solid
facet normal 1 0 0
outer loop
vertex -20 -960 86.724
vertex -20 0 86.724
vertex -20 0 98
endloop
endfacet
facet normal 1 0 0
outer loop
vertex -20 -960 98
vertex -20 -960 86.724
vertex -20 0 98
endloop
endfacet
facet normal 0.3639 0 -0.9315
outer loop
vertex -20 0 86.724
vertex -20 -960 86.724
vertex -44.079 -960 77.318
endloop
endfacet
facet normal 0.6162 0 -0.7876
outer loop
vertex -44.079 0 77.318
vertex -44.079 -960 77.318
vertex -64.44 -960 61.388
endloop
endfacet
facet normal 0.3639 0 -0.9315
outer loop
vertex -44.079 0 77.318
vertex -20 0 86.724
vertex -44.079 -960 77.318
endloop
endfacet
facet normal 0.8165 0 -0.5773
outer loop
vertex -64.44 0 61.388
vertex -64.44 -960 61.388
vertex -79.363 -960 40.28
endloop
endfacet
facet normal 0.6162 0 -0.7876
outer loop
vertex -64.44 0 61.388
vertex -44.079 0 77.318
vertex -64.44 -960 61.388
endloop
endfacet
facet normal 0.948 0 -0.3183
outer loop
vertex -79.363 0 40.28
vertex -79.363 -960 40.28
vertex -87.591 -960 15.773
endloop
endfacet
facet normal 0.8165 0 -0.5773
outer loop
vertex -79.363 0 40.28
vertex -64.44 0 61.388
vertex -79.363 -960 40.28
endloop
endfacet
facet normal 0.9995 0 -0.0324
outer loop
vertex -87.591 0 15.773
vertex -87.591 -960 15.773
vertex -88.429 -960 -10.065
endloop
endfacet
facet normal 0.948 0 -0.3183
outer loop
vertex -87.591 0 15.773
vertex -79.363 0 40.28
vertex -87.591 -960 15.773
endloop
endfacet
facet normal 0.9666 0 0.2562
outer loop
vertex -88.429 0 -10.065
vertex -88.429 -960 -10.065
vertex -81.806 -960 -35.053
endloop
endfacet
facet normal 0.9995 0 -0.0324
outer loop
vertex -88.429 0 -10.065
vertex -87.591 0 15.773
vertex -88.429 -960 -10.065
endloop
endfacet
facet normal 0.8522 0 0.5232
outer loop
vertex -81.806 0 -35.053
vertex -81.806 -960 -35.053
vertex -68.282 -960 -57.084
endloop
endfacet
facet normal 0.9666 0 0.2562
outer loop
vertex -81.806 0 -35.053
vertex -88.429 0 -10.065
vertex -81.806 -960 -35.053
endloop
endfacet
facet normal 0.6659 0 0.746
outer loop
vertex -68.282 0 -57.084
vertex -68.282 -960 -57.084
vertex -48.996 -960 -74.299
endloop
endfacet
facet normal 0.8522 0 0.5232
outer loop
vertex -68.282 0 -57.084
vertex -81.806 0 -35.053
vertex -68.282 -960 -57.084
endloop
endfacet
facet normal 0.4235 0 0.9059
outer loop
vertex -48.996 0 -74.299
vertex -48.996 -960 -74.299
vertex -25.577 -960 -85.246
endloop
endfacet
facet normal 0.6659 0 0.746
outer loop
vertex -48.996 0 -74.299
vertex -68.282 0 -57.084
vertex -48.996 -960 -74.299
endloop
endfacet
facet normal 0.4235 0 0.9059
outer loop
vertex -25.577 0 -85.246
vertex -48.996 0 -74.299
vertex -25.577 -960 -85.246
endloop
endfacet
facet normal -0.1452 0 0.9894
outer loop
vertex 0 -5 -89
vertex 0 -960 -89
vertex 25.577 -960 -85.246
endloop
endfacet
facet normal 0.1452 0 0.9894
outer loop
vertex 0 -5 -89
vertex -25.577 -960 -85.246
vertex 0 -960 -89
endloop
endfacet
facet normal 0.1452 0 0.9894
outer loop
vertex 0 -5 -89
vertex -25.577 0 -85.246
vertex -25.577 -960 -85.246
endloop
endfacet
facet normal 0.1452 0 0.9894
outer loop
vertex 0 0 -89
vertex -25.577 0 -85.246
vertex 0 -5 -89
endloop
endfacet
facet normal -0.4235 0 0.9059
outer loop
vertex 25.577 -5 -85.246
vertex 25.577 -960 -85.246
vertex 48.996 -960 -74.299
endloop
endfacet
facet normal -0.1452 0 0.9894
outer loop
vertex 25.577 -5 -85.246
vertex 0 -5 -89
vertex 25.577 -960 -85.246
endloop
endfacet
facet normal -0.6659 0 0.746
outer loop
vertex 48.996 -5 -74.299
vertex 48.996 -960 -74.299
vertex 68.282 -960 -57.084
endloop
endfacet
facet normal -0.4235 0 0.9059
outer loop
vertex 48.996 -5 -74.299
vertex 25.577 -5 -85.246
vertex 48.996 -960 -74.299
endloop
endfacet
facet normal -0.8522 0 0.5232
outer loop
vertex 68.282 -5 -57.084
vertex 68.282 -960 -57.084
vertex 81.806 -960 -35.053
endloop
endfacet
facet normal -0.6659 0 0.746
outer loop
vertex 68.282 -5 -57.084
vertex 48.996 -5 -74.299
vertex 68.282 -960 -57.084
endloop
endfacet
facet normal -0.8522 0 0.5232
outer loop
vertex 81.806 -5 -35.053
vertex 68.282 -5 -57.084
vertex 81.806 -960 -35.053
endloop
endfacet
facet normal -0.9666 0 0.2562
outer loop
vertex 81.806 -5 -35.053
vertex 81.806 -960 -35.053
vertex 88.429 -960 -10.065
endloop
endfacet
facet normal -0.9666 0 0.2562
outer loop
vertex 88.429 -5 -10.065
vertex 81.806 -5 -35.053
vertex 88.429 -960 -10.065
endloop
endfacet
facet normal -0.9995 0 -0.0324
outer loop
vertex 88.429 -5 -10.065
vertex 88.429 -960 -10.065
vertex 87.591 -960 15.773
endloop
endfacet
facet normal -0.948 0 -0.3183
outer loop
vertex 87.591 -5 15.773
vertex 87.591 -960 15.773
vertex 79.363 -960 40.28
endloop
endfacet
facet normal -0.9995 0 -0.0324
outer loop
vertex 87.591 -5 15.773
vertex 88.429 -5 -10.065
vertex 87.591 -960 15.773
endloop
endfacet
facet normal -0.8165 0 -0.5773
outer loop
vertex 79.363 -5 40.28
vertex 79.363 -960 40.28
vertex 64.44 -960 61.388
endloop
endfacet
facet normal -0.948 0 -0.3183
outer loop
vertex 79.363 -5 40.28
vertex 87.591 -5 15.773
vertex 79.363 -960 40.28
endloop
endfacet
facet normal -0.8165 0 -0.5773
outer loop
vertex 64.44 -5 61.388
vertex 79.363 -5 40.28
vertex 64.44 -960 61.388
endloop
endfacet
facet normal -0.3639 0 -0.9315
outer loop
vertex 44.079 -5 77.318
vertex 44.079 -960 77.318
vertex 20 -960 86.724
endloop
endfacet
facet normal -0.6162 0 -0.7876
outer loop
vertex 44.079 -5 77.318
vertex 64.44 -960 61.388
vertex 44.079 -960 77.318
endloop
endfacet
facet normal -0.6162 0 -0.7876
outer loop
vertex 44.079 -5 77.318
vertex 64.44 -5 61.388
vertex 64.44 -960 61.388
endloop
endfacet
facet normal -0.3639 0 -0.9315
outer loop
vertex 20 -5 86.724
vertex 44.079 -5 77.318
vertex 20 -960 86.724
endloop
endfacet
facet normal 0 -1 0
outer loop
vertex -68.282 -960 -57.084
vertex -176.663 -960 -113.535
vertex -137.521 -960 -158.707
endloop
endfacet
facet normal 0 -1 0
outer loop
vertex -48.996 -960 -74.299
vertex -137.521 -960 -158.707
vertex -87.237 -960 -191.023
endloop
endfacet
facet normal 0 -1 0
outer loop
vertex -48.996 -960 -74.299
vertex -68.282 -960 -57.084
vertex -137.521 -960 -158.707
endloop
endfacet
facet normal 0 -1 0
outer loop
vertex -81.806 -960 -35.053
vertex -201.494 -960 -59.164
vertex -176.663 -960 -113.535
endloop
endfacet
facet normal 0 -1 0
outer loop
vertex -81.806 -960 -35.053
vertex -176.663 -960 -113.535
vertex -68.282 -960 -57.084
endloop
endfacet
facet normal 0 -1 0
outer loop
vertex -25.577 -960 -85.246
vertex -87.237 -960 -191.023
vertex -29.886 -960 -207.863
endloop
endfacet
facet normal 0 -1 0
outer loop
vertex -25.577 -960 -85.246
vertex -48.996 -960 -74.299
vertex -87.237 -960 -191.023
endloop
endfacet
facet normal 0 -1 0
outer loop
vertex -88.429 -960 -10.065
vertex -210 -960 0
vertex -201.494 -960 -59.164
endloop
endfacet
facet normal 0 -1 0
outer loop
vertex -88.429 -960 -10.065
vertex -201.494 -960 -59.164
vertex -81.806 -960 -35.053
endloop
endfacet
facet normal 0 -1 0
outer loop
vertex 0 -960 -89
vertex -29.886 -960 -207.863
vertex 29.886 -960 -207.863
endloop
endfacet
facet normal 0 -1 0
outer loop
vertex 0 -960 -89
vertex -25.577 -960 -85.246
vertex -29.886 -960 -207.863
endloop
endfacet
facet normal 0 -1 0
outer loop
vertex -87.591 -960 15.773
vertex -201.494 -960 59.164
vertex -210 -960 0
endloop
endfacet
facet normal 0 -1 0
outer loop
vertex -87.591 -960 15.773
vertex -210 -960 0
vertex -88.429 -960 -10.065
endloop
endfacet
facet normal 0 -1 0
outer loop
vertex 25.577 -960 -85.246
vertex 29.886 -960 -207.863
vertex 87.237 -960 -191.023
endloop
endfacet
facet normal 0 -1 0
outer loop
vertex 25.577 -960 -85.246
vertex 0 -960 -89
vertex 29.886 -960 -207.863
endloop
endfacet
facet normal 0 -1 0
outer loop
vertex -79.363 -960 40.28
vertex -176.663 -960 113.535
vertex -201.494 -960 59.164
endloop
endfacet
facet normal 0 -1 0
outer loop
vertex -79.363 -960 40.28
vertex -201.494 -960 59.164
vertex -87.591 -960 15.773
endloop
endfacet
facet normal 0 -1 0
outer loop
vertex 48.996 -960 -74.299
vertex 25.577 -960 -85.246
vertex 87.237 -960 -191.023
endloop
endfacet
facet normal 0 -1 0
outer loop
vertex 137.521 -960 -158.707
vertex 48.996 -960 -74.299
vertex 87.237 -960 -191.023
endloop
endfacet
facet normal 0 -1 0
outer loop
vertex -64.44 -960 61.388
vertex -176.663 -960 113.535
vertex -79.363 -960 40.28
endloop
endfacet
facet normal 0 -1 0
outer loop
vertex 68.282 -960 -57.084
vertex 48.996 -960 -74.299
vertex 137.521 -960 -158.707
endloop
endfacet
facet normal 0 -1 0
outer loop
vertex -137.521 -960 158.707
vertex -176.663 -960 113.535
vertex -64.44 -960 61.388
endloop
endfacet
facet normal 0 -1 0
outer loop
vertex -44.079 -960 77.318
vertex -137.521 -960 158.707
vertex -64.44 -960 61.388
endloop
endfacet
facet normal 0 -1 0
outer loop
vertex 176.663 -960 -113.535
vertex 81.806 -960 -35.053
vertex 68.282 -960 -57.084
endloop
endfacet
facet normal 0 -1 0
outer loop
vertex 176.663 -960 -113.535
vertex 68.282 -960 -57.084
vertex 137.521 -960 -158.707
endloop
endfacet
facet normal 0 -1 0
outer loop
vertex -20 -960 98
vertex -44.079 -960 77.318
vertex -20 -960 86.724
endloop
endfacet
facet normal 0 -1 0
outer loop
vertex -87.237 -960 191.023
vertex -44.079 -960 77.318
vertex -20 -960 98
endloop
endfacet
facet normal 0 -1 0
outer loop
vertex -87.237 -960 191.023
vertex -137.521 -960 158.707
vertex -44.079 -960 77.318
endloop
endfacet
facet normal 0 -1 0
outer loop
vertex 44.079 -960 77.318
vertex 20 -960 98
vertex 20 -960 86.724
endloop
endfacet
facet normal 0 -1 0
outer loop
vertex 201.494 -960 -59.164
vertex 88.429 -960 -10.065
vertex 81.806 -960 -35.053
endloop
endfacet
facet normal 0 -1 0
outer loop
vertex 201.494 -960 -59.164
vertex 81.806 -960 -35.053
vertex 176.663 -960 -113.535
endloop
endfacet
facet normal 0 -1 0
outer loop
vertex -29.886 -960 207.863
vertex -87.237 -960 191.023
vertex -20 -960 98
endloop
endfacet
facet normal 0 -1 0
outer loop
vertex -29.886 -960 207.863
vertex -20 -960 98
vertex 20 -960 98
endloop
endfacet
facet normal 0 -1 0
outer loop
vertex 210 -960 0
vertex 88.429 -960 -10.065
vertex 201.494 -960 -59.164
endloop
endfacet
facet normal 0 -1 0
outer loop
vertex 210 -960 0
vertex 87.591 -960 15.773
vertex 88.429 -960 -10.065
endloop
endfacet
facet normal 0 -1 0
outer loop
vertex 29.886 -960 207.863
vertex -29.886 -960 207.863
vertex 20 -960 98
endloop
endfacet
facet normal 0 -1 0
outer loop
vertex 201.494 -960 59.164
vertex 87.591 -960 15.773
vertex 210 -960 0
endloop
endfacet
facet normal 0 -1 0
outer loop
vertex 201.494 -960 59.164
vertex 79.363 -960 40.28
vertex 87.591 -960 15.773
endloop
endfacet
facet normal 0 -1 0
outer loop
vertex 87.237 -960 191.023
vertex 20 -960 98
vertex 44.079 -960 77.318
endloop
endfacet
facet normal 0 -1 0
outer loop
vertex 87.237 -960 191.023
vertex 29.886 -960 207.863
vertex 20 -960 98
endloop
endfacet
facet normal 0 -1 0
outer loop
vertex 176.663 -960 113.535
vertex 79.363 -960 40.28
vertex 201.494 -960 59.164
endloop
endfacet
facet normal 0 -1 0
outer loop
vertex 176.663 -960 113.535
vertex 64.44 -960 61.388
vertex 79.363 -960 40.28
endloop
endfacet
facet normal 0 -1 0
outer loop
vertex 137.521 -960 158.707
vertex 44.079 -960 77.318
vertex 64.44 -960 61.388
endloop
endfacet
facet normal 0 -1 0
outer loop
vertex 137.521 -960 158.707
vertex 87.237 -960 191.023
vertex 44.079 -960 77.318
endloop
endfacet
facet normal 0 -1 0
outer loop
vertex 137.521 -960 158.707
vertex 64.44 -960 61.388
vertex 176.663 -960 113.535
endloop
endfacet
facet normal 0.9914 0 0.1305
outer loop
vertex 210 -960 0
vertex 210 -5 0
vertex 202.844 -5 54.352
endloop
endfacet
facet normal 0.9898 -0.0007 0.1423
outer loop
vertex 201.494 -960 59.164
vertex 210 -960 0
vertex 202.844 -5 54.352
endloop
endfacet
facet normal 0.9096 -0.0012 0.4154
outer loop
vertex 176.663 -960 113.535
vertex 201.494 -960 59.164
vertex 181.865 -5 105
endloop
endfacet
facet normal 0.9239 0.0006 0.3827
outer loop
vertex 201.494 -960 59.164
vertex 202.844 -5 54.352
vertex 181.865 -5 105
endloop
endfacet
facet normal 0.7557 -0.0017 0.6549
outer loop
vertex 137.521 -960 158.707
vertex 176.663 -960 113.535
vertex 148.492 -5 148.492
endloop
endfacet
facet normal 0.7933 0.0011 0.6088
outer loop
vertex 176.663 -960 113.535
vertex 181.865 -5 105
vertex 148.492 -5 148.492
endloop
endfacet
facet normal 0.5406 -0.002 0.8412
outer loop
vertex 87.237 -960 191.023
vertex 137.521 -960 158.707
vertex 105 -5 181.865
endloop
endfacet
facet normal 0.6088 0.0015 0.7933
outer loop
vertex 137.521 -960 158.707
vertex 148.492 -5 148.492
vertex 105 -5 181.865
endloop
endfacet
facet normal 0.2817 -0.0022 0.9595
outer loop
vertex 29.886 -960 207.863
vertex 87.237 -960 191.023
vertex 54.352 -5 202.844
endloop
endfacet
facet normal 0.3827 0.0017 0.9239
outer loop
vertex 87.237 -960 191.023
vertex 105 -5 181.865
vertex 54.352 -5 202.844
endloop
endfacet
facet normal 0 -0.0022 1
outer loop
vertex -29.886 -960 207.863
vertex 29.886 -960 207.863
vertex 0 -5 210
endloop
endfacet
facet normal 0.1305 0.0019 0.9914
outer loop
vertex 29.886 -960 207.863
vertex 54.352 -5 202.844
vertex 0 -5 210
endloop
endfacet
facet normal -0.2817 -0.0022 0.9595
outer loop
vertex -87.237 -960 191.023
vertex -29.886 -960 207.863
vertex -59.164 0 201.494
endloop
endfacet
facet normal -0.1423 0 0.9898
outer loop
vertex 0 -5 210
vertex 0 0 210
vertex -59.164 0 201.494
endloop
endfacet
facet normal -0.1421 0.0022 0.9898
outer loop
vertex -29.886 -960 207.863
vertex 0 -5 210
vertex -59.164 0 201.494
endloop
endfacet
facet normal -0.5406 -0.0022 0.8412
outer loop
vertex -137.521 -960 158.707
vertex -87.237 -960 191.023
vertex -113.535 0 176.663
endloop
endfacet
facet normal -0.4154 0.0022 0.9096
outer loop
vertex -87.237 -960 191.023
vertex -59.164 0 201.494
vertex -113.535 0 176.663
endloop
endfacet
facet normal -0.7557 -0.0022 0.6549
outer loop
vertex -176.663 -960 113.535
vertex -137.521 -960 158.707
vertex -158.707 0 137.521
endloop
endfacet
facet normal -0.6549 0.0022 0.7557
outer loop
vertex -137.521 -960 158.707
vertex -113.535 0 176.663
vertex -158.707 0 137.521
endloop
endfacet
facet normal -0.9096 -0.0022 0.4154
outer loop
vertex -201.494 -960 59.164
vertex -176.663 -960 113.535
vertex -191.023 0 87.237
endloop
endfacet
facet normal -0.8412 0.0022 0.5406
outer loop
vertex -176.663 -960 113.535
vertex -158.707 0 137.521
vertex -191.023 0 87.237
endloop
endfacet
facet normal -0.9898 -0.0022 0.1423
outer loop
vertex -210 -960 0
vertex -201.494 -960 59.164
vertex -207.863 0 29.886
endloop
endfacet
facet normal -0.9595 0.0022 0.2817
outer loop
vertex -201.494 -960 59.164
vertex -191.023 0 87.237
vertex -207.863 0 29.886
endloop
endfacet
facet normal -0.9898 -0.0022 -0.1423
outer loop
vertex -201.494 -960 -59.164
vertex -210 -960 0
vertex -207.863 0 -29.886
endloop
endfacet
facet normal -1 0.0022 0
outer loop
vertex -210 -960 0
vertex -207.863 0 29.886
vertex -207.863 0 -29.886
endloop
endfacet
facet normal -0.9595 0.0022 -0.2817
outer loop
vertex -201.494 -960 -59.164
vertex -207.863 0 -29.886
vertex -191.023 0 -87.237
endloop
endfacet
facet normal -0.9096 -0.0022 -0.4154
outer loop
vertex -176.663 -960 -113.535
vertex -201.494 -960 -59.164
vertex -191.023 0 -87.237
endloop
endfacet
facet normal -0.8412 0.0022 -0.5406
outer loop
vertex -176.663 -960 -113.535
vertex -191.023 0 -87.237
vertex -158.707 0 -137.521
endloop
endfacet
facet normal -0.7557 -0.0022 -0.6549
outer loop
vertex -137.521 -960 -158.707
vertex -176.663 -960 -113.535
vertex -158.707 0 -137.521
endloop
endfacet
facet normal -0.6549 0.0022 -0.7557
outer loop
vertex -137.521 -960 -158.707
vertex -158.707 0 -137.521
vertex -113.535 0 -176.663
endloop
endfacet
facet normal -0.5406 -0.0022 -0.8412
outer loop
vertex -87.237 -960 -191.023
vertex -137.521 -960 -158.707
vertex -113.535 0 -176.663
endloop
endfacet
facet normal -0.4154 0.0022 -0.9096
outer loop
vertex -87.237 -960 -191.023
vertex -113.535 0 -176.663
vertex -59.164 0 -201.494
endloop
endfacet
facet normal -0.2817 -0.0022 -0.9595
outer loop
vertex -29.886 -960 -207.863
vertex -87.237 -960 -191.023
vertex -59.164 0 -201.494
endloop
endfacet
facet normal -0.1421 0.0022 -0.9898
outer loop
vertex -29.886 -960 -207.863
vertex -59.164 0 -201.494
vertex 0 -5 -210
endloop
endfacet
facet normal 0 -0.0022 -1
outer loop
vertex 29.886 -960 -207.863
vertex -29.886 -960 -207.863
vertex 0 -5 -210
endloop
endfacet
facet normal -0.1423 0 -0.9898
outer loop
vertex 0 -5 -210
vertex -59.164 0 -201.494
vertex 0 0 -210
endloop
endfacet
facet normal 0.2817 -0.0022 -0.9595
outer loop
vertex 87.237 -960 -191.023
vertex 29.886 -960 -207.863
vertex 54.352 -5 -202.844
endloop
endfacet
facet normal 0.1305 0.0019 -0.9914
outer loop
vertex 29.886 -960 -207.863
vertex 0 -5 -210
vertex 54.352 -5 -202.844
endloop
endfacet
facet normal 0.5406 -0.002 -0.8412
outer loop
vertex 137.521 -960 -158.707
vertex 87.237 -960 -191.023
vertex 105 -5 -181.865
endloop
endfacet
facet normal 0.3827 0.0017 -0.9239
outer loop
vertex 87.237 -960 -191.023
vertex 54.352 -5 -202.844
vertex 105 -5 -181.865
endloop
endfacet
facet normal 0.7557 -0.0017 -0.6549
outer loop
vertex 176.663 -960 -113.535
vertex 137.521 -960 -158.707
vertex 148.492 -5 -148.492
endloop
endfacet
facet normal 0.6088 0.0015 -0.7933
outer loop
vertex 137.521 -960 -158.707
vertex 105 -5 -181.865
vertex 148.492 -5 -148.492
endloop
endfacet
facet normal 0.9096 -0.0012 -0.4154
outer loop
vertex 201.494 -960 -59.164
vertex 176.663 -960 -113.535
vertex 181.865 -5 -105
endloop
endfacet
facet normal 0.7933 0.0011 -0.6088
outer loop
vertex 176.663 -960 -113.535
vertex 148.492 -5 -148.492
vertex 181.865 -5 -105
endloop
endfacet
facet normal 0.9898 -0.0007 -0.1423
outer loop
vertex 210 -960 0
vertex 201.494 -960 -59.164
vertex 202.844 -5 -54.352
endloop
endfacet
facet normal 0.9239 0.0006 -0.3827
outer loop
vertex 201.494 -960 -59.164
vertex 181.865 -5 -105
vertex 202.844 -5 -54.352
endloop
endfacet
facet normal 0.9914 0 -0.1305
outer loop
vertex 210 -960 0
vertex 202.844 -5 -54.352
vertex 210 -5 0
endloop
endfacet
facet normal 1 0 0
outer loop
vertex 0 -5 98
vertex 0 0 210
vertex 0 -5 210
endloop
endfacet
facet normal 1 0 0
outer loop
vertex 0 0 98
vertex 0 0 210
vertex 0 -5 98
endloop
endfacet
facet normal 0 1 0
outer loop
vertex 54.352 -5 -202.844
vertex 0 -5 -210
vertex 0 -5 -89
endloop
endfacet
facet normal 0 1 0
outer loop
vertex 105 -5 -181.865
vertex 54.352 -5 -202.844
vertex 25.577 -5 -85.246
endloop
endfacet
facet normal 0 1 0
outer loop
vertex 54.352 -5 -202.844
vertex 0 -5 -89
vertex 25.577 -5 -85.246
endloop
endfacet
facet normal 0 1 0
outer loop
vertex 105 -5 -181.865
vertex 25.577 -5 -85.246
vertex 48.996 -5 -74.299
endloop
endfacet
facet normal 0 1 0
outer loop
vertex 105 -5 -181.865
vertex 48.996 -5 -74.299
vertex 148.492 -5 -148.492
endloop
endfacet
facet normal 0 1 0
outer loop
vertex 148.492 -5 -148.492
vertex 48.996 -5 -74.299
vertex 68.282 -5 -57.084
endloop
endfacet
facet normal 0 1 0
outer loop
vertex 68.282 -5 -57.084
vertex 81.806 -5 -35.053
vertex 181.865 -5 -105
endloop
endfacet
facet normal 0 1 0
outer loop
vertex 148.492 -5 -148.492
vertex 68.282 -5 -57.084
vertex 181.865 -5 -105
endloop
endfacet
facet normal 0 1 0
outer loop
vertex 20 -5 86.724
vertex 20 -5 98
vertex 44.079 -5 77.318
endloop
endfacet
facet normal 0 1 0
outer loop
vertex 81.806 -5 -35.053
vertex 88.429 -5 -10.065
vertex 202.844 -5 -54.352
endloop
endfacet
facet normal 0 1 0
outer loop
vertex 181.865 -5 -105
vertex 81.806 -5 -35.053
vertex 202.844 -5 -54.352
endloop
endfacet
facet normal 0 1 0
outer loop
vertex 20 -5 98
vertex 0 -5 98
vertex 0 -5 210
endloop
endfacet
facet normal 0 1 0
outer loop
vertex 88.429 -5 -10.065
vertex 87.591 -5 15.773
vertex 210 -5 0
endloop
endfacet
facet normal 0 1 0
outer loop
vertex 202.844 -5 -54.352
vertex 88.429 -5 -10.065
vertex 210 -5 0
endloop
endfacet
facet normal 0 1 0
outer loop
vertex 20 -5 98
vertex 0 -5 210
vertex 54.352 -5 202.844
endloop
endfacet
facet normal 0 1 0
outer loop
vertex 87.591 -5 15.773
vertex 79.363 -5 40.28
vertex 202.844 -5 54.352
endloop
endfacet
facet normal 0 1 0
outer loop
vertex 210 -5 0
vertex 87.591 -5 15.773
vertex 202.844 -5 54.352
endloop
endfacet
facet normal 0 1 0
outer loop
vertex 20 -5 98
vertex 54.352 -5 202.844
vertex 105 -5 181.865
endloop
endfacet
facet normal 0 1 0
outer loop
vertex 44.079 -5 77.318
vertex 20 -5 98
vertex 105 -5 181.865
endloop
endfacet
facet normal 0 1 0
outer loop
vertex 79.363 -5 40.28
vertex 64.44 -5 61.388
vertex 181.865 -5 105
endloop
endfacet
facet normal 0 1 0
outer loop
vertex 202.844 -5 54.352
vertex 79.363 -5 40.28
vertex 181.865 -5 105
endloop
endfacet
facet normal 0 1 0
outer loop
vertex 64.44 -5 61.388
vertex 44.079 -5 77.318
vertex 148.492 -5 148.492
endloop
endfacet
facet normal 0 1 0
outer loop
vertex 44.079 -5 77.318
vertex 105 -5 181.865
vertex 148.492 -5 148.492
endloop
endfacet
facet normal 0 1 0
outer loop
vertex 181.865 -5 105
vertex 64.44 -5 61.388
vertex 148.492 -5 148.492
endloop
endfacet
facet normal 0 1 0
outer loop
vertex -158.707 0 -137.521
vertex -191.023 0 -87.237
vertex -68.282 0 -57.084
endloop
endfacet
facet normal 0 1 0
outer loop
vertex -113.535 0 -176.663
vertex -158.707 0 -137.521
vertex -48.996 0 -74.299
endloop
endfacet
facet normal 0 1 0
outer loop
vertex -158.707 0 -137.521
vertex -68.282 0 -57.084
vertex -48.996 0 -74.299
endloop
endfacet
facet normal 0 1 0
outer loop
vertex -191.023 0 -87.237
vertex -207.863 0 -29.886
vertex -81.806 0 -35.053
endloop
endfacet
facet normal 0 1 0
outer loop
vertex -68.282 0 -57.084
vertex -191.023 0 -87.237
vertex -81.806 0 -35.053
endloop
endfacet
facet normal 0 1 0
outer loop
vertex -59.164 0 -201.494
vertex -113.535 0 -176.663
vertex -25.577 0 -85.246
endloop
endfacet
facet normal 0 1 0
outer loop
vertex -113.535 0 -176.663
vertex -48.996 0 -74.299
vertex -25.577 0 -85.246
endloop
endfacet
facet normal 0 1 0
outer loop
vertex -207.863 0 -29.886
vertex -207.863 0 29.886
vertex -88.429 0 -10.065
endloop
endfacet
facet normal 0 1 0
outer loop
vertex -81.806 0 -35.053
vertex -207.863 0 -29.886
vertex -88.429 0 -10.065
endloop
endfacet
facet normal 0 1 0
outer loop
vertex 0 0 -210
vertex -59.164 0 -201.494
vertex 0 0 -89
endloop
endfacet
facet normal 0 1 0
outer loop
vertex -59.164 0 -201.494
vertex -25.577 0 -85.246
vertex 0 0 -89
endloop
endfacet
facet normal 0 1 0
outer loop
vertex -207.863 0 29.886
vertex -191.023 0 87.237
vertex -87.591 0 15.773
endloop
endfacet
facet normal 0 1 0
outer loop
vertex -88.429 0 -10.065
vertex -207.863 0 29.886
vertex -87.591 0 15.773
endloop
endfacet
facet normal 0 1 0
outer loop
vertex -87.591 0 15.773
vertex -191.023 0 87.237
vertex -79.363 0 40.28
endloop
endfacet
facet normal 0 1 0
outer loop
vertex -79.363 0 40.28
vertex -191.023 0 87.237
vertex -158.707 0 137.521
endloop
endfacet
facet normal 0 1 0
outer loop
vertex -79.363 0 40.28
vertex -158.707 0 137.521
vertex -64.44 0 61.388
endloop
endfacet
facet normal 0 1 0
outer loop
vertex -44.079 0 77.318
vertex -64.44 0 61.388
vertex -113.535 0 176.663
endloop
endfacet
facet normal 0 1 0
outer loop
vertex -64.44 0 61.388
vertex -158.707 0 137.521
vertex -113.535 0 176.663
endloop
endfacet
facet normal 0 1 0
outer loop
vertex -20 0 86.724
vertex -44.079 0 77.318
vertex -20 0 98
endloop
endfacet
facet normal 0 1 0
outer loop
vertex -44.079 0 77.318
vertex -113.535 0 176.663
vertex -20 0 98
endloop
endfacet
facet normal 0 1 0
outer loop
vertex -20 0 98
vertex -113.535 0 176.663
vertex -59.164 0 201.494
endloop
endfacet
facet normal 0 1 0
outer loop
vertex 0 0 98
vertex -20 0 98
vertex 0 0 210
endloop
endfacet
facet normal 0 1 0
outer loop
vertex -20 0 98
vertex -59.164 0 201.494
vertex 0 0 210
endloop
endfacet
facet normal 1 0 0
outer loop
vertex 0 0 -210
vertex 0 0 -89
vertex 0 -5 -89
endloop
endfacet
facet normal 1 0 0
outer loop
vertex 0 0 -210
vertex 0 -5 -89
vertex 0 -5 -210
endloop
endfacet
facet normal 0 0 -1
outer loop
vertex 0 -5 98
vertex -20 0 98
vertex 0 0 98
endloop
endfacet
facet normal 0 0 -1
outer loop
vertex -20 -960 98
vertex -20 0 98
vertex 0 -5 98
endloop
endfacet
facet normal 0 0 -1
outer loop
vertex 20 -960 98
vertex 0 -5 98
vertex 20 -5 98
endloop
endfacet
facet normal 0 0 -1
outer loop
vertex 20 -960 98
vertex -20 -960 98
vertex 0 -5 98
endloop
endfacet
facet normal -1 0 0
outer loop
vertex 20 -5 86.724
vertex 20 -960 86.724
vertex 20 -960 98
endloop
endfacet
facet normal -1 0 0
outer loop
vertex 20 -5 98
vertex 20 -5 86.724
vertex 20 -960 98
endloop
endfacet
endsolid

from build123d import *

# Parameters (mm, degrees)
F1_R     = 210
F1_R_2   = 89
F2_DEPTH = 960
F3_W     = 40
F3_H     = 35.969428
F4_DEPTH = 1035
F6_DEPTH = 5


with BuildPart() as f2:
    # F1 (on face) → F2 (new body)
    with BuildSketch(Plane.XZ):
        Circle(F1_R)
        Circle(F1_R_2, mode=Mode.SUBTRACT)
    extrude(amount=F2_DEPTH)

    # F3 (on face) → F4 (cut)
    with BuildSketch(Plane.XZ.offset(960)):
        with Locations((0, 80.015286)):
            Rectangle(F3_W, F3_H)
    extrude(amount=-F4_DEPTH, mode=Mode.SUBTRACT)

    # F5 (on face) → F6 (cut)
    with BuildSketch(Plane.XZ):
        Polygon((0, 269.126058), (0, 0), (0, -241.775826), (255.997956, -190.357447), (264.750004, 22.974176), (219.895661, 219.895661), (88.614672, 269.126058), align=None)
    extrude(amount=F6_DEPTH, mode=Mode.SUBTRACT)


solid = f2.part
